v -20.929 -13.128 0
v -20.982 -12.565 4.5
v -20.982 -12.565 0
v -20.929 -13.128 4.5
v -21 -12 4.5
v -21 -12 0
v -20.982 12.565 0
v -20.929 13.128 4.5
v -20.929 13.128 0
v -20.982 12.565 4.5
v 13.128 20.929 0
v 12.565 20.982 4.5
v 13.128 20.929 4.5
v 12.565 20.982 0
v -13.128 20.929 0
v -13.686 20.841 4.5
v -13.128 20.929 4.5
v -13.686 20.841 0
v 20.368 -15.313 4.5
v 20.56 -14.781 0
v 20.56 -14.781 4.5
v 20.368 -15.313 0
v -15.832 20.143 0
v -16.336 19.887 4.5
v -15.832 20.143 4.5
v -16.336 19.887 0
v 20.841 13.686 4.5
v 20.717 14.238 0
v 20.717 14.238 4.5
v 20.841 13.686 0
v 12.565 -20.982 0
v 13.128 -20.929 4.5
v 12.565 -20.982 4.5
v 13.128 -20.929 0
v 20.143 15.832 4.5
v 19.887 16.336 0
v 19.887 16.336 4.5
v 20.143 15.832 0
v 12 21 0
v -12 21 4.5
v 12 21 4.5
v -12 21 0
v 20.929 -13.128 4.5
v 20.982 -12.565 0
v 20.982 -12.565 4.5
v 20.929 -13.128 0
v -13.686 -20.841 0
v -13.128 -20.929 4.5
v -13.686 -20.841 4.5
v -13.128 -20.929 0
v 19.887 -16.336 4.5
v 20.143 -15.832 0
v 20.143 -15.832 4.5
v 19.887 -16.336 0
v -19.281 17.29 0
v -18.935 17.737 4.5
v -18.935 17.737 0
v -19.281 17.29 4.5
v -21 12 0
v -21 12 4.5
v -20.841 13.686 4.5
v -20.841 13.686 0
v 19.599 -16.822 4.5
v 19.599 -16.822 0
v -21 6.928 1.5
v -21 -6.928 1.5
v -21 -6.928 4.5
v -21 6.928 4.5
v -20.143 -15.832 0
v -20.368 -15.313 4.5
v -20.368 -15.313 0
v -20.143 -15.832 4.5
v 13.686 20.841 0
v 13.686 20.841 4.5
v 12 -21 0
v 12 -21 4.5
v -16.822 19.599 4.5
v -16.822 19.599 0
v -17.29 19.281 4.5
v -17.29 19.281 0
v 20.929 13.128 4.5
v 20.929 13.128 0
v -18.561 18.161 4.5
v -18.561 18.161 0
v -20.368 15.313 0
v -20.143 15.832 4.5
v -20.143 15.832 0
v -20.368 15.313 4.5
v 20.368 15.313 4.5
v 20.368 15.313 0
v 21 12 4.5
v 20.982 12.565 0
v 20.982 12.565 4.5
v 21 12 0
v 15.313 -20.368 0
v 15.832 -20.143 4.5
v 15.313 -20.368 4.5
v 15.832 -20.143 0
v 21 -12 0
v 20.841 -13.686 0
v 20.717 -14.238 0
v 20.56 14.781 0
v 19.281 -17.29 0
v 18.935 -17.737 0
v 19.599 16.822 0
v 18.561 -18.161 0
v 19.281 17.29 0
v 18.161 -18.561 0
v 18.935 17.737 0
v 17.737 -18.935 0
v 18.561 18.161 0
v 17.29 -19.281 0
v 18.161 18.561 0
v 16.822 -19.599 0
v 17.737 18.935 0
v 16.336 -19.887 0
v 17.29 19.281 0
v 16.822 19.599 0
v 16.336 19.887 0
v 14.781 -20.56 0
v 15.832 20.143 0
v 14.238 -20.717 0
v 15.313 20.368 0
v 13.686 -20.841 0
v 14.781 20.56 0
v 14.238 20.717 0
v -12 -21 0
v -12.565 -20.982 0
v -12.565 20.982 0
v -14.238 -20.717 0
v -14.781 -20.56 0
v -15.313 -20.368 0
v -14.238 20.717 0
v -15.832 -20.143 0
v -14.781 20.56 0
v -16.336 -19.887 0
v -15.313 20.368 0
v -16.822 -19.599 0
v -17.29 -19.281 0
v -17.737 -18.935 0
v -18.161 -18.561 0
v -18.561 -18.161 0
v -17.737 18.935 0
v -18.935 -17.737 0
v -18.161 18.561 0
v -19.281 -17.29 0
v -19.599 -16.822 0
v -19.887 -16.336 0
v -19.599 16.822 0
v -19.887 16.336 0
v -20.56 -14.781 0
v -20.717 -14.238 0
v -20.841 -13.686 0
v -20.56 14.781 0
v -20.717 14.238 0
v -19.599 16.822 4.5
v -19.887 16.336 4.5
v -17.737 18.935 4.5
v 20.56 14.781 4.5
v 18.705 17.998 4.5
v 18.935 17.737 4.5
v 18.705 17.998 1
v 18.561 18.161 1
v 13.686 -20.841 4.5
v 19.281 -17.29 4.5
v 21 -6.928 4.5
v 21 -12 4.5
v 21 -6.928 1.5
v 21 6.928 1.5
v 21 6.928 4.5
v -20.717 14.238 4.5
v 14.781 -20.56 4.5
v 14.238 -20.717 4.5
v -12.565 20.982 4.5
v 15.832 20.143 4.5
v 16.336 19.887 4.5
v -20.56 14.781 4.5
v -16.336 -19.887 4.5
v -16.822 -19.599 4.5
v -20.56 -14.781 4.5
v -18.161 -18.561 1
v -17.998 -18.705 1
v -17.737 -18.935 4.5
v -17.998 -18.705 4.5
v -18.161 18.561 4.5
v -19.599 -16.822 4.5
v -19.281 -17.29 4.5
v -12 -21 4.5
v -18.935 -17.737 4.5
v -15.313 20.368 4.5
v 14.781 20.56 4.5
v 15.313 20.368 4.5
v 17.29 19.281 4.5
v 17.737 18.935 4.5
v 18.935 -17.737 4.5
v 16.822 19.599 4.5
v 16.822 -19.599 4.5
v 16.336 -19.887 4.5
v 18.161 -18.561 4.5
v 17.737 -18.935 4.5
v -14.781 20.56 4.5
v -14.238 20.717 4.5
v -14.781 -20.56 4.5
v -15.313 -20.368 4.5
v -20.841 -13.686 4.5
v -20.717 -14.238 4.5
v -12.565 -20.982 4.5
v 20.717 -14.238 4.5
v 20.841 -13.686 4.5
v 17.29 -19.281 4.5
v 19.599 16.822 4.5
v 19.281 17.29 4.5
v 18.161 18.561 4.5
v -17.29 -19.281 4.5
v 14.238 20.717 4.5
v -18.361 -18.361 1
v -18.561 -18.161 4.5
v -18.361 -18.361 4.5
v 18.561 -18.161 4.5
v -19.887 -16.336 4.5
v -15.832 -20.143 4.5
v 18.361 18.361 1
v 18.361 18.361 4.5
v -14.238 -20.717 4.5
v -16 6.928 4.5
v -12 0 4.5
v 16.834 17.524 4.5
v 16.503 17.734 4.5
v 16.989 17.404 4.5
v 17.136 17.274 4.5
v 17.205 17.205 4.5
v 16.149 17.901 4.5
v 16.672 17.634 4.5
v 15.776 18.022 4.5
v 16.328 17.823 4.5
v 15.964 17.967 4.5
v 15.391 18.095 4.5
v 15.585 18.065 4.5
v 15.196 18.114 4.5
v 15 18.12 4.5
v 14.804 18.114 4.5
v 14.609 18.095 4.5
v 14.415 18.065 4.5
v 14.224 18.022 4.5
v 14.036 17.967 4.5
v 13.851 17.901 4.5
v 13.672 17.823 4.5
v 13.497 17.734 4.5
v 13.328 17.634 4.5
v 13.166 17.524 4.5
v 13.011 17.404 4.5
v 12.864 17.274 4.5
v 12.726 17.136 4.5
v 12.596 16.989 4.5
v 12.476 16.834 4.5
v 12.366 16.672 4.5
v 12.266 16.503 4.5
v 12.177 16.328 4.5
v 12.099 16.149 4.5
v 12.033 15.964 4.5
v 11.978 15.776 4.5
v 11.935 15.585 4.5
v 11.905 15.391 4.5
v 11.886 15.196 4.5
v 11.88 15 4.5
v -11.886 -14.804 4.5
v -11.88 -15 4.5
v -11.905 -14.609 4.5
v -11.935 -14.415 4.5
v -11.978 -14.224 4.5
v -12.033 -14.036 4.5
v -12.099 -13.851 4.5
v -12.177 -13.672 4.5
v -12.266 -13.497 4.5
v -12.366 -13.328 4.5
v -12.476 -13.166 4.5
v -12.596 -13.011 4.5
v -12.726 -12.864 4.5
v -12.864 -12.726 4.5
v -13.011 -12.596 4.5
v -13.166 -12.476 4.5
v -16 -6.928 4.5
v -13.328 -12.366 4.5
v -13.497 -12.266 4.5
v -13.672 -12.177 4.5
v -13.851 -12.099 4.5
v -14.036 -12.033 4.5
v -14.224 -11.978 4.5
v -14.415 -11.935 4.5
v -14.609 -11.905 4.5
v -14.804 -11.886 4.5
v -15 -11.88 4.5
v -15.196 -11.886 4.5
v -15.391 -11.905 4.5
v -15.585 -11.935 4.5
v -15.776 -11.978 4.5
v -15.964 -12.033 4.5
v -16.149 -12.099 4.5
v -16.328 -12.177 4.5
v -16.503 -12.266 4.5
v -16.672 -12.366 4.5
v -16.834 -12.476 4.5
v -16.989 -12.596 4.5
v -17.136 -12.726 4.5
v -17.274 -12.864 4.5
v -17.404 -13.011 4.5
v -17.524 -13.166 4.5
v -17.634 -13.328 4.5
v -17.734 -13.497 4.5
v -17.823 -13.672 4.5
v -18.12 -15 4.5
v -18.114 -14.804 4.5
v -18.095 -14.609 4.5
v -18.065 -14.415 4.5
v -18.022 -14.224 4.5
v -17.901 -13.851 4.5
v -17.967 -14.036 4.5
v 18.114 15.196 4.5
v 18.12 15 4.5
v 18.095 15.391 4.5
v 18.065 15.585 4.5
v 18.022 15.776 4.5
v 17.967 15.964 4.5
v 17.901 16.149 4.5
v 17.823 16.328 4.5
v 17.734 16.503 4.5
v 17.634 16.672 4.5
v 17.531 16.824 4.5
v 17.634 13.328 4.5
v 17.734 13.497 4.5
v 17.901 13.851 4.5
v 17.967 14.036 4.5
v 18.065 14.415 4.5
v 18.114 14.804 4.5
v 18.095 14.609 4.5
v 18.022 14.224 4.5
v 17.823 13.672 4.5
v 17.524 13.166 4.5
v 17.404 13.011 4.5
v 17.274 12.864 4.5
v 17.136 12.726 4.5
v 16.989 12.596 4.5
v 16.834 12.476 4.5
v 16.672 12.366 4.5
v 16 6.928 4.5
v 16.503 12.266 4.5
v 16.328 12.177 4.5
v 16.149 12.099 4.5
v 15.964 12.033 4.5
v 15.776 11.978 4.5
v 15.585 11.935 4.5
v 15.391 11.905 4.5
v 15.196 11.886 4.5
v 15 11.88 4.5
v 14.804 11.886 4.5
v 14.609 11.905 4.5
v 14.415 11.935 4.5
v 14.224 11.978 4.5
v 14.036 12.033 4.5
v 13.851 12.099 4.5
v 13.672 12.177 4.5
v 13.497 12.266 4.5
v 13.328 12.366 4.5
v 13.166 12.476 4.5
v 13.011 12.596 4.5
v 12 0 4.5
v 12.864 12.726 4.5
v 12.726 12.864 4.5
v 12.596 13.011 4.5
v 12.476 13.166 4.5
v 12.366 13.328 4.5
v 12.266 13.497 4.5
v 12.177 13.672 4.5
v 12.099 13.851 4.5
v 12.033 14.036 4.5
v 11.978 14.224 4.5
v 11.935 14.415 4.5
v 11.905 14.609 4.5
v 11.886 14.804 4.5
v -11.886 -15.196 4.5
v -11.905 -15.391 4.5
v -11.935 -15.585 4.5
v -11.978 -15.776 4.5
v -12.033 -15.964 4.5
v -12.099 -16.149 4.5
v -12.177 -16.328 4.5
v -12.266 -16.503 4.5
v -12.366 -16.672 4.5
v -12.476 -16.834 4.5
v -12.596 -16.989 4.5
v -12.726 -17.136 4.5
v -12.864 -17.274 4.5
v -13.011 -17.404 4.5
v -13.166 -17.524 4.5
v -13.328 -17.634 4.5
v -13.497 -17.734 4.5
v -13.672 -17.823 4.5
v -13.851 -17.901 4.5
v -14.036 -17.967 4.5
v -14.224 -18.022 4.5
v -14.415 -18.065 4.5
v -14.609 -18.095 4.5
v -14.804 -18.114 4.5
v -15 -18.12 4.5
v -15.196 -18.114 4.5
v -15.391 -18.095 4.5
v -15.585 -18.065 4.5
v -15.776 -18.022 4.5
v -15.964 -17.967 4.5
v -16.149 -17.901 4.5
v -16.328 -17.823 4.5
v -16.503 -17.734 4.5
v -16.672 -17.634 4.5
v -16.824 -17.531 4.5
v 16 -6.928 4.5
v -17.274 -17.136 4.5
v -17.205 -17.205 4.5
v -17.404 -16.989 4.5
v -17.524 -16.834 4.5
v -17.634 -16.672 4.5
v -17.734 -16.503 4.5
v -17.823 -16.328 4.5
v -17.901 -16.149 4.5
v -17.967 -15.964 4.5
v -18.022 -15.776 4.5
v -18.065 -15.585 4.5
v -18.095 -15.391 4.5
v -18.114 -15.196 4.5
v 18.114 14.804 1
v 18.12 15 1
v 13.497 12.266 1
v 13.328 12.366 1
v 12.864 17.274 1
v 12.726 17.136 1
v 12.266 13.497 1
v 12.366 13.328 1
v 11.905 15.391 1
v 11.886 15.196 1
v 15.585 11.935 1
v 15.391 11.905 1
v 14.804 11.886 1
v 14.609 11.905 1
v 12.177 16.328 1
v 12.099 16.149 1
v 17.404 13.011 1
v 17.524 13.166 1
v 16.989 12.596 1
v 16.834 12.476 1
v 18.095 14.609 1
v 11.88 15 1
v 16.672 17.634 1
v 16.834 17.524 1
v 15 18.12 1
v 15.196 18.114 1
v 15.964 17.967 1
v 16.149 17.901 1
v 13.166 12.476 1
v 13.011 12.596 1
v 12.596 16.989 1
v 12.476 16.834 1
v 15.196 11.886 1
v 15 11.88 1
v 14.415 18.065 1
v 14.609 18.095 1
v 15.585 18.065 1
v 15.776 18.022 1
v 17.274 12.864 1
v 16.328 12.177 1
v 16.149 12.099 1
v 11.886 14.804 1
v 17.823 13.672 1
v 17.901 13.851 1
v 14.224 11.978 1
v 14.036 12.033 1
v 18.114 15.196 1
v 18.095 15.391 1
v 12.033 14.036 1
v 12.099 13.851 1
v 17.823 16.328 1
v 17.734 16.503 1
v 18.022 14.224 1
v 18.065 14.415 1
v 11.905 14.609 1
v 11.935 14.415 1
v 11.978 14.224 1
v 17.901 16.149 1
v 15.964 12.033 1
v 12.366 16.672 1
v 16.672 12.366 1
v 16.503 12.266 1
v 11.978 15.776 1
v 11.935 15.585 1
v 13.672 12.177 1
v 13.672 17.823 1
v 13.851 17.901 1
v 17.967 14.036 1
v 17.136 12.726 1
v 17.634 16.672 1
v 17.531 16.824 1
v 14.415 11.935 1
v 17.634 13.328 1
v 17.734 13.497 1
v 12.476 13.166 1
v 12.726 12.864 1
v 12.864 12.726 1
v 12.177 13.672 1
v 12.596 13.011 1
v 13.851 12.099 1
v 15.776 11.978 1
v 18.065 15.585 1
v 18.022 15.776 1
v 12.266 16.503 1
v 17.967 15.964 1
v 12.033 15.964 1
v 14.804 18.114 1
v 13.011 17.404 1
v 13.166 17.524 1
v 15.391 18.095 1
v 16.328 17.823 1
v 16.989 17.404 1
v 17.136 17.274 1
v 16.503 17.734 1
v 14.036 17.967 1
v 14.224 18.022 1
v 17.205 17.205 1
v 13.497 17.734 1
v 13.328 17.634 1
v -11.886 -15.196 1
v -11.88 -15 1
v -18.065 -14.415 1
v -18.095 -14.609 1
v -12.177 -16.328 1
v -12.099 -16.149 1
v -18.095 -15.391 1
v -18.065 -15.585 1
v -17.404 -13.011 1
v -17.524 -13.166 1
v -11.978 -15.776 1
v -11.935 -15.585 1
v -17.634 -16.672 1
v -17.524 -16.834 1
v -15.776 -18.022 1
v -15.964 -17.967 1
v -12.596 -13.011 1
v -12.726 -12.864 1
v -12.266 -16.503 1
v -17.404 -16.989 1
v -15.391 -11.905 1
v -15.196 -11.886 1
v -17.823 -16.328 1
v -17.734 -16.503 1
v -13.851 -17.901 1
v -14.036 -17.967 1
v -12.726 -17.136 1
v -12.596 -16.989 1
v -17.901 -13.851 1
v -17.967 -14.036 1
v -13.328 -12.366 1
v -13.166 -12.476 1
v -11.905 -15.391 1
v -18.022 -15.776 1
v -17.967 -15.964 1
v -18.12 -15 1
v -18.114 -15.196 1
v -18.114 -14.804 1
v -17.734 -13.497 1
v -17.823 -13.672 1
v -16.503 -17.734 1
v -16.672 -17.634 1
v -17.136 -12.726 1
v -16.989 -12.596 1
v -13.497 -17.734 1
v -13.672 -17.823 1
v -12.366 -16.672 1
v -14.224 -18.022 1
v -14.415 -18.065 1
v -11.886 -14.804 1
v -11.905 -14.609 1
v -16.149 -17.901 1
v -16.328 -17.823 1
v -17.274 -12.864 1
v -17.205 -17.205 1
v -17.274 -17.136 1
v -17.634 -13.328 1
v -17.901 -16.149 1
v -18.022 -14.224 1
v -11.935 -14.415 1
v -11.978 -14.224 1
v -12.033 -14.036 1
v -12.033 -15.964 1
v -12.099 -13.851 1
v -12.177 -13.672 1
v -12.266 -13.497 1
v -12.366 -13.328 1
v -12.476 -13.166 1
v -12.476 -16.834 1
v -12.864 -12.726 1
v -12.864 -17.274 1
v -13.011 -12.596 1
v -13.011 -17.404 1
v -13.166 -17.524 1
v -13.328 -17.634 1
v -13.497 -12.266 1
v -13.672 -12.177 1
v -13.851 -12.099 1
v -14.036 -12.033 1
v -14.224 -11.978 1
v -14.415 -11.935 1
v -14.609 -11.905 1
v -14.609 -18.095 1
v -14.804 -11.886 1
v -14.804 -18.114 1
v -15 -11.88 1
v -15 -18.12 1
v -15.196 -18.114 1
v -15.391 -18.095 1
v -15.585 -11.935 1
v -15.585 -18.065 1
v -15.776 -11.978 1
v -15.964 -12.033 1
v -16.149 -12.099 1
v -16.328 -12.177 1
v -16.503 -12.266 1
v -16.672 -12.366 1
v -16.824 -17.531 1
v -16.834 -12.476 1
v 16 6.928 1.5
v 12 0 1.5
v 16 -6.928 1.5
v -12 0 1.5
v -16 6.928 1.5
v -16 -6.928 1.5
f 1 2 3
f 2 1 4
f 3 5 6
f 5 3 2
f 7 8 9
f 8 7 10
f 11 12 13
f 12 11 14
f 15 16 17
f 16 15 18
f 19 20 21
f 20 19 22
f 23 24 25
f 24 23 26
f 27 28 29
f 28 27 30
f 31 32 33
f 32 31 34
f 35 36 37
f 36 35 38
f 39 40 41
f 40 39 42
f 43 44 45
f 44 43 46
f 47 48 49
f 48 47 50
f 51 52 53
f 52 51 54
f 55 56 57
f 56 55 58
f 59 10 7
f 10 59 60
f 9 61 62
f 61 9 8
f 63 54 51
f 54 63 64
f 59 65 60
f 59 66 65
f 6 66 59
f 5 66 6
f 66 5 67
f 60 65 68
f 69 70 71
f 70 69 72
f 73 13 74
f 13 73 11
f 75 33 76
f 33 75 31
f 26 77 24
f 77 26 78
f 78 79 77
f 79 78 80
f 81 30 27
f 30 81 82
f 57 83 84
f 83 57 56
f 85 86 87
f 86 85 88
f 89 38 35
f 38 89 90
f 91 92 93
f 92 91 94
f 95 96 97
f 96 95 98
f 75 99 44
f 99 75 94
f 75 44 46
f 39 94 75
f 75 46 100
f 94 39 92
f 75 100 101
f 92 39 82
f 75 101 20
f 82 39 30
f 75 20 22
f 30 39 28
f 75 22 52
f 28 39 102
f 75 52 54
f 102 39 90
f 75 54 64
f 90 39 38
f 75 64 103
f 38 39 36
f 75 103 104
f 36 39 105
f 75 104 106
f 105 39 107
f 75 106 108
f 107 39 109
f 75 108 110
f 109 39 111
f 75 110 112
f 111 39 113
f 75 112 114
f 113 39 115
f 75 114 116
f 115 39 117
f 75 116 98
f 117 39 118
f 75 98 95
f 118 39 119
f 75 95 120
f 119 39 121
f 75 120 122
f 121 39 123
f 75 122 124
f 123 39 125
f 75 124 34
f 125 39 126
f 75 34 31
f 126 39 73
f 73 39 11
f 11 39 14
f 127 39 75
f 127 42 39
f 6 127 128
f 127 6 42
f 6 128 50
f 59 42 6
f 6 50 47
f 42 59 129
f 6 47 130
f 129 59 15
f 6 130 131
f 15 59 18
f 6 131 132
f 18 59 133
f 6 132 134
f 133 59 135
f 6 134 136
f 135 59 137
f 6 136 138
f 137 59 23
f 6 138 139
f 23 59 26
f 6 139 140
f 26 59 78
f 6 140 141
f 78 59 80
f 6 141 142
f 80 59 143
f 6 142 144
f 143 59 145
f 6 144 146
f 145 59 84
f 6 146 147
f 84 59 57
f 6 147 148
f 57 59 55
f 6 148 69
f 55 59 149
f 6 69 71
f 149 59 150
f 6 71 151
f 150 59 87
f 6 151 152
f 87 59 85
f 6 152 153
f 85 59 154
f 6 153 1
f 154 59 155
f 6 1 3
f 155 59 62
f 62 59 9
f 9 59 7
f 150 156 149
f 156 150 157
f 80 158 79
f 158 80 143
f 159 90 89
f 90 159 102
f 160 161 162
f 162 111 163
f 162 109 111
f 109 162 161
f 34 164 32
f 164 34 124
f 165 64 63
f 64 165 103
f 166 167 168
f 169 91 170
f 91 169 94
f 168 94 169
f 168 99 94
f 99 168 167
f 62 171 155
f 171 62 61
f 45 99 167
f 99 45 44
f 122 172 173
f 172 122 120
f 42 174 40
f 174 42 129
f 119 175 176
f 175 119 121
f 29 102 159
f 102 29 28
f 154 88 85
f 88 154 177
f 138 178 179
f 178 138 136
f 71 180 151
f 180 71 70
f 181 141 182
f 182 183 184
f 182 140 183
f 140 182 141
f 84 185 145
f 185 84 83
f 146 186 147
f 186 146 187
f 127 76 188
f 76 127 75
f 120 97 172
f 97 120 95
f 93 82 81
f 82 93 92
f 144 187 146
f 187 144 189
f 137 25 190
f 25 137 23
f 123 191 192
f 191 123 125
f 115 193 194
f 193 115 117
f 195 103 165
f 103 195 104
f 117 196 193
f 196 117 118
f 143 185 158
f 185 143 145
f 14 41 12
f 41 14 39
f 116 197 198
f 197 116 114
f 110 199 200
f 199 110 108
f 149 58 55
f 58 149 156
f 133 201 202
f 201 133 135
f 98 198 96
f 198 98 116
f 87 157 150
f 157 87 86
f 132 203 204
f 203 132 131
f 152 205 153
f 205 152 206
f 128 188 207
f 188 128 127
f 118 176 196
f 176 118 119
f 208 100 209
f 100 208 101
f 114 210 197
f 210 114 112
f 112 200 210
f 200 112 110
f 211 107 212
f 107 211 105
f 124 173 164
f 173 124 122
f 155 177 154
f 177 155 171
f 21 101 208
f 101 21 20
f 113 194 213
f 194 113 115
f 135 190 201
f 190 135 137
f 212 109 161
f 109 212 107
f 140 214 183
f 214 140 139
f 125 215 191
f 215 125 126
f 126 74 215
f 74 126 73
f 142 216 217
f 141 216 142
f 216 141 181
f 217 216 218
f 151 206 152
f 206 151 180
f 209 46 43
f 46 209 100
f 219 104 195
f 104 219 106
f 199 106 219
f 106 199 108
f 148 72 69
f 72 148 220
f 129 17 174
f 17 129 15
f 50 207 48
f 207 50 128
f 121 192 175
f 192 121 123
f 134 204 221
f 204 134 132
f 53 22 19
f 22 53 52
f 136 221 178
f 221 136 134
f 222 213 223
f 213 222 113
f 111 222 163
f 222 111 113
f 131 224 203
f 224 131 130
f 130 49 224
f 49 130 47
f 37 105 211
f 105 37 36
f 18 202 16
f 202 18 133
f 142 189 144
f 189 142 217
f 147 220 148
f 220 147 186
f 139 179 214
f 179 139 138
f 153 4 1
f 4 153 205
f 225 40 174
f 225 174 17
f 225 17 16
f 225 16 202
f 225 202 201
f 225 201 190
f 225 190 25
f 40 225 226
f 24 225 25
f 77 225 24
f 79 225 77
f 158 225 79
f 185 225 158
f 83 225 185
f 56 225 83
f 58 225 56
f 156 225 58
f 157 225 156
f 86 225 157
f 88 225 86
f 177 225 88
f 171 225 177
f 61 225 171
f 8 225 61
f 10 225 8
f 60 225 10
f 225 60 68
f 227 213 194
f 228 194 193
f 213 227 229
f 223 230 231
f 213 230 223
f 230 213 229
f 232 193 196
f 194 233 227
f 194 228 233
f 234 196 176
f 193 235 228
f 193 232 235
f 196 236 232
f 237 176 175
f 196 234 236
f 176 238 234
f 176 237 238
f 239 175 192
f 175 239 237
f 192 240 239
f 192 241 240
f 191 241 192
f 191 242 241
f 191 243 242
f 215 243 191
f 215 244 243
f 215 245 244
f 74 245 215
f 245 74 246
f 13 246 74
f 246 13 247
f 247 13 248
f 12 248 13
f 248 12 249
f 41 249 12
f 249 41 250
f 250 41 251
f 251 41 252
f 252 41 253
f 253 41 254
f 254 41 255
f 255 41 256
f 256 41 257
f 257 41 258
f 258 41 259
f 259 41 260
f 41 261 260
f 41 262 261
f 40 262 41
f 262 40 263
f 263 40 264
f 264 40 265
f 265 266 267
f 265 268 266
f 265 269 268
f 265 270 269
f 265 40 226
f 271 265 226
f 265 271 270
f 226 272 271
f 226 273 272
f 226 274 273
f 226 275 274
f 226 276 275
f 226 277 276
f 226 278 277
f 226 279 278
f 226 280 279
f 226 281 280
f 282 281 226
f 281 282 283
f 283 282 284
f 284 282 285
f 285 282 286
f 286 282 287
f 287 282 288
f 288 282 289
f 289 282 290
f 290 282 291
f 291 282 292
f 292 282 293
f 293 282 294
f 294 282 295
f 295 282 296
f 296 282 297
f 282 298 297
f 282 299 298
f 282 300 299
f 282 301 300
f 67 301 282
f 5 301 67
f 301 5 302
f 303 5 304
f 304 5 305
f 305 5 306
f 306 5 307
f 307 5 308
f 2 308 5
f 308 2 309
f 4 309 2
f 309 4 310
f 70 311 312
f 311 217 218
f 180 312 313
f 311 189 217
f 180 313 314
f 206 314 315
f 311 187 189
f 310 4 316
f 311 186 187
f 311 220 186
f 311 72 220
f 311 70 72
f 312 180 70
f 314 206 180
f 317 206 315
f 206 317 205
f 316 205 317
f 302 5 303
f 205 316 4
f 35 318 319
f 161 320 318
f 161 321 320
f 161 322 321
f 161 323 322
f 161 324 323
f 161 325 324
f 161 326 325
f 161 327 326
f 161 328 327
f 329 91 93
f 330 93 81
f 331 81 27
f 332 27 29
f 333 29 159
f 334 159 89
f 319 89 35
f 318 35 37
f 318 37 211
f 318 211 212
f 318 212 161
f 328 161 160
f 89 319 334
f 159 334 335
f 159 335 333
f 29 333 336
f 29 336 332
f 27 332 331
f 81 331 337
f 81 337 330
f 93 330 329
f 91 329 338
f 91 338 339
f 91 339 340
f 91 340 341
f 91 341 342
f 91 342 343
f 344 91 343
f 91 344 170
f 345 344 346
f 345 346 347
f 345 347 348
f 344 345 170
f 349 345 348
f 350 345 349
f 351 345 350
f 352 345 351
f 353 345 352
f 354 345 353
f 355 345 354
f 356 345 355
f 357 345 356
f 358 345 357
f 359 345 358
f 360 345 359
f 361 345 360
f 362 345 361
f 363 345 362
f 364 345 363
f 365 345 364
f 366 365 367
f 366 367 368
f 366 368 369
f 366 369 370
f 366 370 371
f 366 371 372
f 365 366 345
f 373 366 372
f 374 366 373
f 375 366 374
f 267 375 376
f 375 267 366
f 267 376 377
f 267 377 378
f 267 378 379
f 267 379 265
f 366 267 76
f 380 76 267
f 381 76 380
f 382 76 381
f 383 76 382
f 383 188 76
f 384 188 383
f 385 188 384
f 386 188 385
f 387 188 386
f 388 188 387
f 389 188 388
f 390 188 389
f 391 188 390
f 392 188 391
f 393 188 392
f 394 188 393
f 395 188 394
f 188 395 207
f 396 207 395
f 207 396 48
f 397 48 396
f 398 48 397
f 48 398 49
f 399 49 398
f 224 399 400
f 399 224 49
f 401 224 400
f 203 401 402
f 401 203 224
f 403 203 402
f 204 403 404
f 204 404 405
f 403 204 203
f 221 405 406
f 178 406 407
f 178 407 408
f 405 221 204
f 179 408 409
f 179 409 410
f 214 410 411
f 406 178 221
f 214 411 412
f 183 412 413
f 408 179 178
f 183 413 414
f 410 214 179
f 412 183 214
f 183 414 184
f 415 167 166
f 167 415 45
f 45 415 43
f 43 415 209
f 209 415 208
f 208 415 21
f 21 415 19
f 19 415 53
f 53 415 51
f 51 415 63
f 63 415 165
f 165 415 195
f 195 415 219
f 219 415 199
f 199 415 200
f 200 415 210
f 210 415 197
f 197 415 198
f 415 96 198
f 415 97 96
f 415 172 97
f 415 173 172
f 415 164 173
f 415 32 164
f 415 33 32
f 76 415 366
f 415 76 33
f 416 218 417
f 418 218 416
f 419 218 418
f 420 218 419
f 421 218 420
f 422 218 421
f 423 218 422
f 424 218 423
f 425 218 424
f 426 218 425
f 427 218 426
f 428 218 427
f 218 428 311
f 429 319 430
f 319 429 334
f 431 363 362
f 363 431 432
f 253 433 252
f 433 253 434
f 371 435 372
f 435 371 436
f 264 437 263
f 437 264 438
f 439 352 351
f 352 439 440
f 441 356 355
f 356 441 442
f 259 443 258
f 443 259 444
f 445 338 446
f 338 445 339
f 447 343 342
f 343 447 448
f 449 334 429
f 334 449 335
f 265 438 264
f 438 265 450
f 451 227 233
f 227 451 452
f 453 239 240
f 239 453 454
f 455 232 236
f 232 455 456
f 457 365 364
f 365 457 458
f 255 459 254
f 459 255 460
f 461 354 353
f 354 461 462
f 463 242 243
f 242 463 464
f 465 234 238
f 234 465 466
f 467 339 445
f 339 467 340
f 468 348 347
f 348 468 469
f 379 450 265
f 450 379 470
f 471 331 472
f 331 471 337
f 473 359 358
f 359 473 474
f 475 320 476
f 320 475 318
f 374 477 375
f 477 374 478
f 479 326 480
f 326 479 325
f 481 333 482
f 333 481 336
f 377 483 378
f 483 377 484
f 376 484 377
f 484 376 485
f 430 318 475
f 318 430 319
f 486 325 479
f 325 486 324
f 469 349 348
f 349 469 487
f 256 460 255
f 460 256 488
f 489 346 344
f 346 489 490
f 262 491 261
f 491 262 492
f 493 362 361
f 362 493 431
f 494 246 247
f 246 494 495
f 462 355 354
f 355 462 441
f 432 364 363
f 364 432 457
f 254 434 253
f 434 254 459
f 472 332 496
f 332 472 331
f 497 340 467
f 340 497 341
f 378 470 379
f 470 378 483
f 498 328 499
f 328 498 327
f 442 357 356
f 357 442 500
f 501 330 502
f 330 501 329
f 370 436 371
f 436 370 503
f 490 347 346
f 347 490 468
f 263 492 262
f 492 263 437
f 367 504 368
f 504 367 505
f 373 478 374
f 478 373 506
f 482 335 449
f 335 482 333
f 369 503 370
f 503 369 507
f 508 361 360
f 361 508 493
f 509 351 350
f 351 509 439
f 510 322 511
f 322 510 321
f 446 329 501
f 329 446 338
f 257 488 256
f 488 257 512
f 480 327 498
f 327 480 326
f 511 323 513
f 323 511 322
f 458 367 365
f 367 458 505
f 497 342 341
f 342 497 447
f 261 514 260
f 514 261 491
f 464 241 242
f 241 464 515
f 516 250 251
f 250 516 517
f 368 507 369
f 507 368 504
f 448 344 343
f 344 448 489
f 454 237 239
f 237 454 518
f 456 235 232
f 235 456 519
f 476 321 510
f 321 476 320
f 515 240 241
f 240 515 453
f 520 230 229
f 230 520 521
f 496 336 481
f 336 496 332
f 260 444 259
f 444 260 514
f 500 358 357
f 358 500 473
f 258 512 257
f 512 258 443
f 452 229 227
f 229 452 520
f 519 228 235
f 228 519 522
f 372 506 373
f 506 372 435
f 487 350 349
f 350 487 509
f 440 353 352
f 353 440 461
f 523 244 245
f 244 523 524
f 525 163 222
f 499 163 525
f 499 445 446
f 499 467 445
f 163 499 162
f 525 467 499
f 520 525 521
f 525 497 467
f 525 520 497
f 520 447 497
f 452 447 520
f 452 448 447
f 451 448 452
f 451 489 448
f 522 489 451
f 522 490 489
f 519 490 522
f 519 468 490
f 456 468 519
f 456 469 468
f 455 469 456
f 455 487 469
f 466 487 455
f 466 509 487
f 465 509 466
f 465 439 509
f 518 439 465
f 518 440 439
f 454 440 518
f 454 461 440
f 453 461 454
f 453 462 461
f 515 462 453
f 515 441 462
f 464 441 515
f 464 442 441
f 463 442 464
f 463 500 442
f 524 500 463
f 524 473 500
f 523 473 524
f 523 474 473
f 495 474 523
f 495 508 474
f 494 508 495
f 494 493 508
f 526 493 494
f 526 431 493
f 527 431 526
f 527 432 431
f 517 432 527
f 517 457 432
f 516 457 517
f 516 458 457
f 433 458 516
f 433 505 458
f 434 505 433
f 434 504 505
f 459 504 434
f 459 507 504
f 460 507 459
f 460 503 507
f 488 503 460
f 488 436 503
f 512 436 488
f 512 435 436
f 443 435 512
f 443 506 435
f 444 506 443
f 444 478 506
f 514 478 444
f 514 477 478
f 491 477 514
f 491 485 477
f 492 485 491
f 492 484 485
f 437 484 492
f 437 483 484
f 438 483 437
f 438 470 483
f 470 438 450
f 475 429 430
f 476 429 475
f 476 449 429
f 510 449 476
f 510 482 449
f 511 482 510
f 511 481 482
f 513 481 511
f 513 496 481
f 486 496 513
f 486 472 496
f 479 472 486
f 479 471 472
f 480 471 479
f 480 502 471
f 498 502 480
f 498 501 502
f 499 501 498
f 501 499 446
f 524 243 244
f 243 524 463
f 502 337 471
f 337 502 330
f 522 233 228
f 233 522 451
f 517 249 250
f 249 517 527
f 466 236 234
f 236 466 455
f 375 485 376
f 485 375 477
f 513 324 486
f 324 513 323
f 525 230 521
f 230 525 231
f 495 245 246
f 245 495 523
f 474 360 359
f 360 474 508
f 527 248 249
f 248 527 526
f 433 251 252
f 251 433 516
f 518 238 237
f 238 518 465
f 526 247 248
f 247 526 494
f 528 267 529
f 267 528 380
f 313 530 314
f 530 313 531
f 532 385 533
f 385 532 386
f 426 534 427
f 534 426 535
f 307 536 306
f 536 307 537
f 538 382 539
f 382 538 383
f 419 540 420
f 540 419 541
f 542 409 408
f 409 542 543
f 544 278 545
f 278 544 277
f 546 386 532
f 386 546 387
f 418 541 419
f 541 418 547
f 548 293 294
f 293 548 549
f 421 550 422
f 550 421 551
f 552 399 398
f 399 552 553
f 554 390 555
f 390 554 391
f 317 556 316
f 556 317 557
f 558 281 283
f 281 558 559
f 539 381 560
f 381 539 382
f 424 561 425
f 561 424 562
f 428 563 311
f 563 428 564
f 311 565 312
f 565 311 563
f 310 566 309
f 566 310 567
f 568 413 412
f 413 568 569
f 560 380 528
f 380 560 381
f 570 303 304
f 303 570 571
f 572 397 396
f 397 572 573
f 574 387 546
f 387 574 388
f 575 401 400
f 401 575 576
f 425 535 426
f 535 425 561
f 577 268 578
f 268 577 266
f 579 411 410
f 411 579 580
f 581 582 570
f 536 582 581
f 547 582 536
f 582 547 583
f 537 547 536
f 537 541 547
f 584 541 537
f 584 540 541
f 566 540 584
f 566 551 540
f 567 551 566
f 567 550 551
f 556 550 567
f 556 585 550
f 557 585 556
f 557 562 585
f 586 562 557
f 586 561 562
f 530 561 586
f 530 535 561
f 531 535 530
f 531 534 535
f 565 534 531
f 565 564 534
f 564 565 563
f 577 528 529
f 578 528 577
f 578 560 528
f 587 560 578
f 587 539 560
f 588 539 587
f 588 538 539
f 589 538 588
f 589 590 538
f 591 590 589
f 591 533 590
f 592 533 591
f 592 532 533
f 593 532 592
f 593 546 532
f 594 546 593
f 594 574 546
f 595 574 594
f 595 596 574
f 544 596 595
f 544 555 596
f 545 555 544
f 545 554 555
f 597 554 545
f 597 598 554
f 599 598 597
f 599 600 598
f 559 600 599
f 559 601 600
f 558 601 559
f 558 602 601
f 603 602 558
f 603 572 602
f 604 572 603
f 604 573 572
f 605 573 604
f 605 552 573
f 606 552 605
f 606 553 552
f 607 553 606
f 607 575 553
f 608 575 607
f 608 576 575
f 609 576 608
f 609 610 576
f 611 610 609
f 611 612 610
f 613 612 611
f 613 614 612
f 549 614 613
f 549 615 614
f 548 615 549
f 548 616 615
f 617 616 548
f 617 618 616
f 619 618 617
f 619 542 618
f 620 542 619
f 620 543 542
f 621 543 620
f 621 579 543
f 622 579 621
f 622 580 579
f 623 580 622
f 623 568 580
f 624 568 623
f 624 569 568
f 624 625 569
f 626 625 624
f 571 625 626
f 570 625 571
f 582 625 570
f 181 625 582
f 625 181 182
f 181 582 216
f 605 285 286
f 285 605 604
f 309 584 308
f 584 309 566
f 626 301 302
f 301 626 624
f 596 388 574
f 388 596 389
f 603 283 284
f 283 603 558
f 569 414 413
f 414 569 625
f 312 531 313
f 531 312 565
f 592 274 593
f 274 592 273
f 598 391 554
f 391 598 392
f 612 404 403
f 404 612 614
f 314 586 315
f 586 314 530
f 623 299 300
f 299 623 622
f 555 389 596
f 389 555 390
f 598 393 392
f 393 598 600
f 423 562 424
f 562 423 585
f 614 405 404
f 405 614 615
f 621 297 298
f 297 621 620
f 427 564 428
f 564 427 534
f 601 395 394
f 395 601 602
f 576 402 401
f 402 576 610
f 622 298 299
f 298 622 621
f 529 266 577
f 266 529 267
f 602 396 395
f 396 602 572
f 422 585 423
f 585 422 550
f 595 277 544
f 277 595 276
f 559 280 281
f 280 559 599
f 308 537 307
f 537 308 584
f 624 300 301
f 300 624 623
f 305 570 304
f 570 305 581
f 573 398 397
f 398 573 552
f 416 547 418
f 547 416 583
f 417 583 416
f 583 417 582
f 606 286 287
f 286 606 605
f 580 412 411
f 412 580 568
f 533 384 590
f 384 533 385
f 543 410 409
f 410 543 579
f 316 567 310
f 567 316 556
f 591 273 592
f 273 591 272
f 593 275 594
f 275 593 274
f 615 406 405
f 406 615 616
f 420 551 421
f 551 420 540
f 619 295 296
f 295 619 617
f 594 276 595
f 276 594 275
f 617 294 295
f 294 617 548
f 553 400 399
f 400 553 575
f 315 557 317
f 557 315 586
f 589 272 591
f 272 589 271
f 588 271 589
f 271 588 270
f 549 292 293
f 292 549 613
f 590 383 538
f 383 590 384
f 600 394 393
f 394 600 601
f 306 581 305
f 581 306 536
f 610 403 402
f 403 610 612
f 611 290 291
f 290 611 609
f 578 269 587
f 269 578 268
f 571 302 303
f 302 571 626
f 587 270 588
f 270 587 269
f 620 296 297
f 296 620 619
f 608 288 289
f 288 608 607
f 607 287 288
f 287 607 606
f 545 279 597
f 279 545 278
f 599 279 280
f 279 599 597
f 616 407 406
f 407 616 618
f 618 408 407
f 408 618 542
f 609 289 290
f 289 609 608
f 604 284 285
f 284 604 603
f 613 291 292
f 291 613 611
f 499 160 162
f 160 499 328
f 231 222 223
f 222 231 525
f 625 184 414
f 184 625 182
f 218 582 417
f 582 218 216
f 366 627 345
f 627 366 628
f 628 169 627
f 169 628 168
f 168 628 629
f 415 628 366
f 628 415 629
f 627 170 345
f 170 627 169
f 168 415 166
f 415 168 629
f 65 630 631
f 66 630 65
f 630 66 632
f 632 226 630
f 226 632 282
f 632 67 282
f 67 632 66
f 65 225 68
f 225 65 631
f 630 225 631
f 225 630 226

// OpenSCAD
difference(){
    linear_extrude (4.5) hull(){
        translate([12,12,0]) circle(9,$fn=100);
        translate([12,-12,0]) circle(9,$fn=100);
        translate([-12,-12,0]) circle(9,$fn=100);
        translate([-12,12,0]) circle(9,$fn=100);
    }
    // 磁石穴
    translate([15,15,1]) linear_extrude(4) circle(3.12,$fn=100);
    translate([-15,-15,1]) linear_extrude(4) circle(3.12,$fn=100);
    // 溝
    translate([17,17,1]) linear_extrude(4)  rotate(-45) square([0.5,2]);
    translate([-18.5,-18.5,1]) linear_extrude(4)  rotate(-45) square([0.5,2]);
    // 指を掛ける部分
    translate([20,0,1.5]) linear_extrude(3) circle(8,$fn=6);
    translate([-20,0,1.5]) linear_extrude(3) circle(8,$fn=6);
}
